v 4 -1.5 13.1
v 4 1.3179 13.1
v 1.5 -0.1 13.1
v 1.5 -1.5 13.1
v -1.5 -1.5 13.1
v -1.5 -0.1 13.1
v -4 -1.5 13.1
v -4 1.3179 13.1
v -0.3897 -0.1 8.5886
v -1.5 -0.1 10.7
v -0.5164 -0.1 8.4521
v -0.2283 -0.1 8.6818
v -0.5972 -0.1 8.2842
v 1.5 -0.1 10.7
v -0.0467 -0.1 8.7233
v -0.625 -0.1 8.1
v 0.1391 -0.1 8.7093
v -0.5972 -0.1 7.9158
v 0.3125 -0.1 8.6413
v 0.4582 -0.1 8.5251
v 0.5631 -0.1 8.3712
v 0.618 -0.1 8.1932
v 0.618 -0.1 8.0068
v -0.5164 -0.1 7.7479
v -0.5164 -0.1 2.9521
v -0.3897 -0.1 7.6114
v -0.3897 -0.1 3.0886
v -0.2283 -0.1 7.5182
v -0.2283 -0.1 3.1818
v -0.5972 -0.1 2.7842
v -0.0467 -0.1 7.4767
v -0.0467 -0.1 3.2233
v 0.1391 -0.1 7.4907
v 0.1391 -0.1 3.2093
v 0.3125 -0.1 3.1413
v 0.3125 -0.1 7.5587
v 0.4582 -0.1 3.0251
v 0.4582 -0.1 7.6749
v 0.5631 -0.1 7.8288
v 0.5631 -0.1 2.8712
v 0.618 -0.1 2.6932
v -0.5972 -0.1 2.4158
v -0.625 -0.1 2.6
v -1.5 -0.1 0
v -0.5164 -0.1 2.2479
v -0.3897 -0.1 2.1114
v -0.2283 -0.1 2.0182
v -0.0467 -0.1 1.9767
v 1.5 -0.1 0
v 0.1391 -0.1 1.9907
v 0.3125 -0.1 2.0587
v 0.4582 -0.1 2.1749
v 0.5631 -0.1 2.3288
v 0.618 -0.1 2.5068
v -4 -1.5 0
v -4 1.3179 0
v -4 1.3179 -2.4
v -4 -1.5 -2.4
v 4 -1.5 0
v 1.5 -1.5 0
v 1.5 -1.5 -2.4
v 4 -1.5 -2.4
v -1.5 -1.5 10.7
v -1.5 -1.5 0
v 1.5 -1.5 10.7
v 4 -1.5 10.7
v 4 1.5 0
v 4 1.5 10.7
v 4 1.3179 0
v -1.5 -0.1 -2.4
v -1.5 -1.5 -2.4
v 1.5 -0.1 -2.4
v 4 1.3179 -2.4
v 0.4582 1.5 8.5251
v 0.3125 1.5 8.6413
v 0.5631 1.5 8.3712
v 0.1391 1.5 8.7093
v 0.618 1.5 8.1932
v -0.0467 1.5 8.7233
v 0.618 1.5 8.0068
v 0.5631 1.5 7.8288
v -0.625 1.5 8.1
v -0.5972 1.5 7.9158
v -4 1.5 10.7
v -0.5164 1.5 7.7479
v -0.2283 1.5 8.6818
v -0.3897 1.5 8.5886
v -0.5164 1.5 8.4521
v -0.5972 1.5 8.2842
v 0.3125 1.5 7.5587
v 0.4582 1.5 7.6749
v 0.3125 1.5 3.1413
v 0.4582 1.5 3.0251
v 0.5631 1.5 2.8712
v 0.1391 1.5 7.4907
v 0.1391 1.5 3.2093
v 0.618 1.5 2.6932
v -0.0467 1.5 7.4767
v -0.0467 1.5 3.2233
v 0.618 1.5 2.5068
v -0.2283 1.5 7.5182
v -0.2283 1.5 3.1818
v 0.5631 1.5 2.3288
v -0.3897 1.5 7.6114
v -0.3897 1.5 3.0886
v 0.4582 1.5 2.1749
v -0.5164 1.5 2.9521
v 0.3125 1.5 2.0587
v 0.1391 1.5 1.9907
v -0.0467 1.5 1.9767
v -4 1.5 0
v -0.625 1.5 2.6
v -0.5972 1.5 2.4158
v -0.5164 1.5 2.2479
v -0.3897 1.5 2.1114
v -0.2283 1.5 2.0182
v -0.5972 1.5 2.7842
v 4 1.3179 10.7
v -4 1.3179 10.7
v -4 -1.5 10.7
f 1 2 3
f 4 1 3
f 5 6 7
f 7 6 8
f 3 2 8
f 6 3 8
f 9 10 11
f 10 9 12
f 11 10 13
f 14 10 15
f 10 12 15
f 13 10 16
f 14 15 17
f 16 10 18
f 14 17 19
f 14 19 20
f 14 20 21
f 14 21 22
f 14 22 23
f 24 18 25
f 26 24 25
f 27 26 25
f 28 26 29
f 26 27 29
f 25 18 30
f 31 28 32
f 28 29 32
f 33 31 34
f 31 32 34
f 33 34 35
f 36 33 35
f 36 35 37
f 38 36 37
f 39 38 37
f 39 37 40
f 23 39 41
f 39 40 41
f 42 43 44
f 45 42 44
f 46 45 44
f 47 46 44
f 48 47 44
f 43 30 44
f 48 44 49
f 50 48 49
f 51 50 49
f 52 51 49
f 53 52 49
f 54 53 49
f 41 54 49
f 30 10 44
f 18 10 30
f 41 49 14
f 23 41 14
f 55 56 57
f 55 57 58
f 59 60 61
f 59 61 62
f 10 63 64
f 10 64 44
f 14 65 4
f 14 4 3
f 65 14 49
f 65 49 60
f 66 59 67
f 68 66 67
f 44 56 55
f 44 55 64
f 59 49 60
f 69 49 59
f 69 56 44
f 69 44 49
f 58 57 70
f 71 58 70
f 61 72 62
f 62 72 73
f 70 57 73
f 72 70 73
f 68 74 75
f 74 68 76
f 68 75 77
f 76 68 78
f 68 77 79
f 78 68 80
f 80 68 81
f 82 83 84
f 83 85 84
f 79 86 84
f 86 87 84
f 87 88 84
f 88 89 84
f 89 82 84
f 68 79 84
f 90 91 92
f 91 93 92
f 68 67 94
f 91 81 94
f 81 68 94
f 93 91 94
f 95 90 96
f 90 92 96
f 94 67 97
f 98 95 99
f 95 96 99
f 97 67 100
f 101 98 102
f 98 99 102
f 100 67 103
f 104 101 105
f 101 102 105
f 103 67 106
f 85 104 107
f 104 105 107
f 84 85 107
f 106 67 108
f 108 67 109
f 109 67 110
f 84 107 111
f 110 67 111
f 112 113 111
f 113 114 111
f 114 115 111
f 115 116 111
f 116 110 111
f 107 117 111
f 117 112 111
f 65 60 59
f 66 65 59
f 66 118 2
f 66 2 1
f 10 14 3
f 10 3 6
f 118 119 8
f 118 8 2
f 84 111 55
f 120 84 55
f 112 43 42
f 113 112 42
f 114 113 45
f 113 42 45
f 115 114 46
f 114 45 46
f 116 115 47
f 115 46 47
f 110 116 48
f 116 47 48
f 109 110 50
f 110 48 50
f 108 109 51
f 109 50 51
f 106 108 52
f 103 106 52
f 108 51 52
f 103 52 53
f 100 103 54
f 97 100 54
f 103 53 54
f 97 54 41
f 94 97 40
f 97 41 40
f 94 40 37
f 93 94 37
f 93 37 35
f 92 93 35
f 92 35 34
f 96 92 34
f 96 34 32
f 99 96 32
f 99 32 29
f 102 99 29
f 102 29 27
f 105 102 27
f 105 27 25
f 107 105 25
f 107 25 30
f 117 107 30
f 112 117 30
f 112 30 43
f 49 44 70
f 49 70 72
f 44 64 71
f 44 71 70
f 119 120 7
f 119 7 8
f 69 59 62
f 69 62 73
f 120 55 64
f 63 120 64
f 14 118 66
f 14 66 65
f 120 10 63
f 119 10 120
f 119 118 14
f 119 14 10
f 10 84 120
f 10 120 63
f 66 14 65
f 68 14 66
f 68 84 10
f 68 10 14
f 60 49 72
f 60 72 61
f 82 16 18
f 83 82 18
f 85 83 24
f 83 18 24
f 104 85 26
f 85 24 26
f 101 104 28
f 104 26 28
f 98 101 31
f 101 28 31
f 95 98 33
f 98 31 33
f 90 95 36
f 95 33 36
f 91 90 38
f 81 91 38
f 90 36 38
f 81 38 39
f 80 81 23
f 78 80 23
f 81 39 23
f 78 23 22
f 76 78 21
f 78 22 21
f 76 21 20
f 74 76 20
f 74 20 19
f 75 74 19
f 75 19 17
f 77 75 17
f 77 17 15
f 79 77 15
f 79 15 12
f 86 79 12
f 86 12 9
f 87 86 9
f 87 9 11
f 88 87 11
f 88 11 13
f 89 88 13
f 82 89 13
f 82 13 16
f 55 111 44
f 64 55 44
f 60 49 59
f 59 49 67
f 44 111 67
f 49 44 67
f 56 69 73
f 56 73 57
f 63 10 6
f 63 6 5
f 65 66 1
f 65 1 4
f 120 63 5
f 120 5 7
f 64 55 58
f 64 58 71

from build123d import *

# Parameters (mm, degrees)
BOSS_EXTRUDE1_DEPTH          = 10.7
M1_6X0_35_TAPPED_HOLE1_D     = 1.25
M1_6X0_35_TAPPED_HOLE1_DEPTH = 3.2
M1_6X0_35_TAPPED_HOLE1_TIP   = 0.375537887
BOSS_EXTRUDE2_DEPTH          = 2.4
BOSS_EXTRUDE3_DEPTH          = 2.4


with BuildPart() as part:
    # Sketch1 → Boss-Extrude1 (new body)
    with BuildSketch(Plane.XY):
        Polygon((-1.5, -1.5), (-1.5, -0.1), (1.5, -0.1), (1.5, -1.5), (4, -1.5), (4, 1.5), (-4, 1.5), (-4, -1.5), align=None)
    extrude(amount=BOSS_EXTRUDE1_DEPTH)

    # M1.6x0.35 Tapped Hole1
    with Locations(Plane(origin=(0, 1.5, 0), x_dir=(1, 0, 0), z_dir=(0, 1, 0))):
        with Locations((0, -2.6), (0, -8.1)):
            Hole(M1_6X0_35_TAPPED_HOLE1_D / 2, depth=M1_6X0_35_TAPPED_HOLE1_DEPTH)
            with Locations((0, 0, -(M1_6X0_35_TAPPED_HOLE1_DEPTH + M1_6X0_35_TAPPED_HOLE1_TIP / 2))):  # 118° drill point
                Cone(0, M1_6X0_35_TAPPED_HOLE1_D / 2, M1_6X0_35_TAPPED_HOLE1_TIP, mode=Mode.SUBTRACT)


with BuildPart() as body_2:
    # Sketch4 → Boss-Extrude2 (new body)
    with BuildSketch(Plane(origin=(0, 0, 0), x_dir=(-1, 0, 0), z_dir=(0, 0, -1))):
        Polygon((-4, 1.317876406), (4, 1.317876406), (4, -1.5), (1.5, -1.5), (1.5, -0.1), (-1.5, -0.1), (-1.5, -1.5), (-4, -1.5), align=None)
    extrude(amount=BOSS_EXTRUDE2_DEPTH)


with BuildPart() as body_3:
    # Sketch5 → Boss-Extrude3 (new body)
    with BuildSketch(Plane.XY.offset(10.7)):
        Polygon((-4, 1.317876406), (4, 1.317876406), (4, -1.5), (1.5, -1.5), (1.5, -0.1), (-1.5, -0.1), (-1.5, -1.5), (-4, -1.5), align=None)
    extrude(amount=BOSS_EXTRUDE3_DEPTH)


solid = Compound([part.part, body_2.part, body_3.part])
